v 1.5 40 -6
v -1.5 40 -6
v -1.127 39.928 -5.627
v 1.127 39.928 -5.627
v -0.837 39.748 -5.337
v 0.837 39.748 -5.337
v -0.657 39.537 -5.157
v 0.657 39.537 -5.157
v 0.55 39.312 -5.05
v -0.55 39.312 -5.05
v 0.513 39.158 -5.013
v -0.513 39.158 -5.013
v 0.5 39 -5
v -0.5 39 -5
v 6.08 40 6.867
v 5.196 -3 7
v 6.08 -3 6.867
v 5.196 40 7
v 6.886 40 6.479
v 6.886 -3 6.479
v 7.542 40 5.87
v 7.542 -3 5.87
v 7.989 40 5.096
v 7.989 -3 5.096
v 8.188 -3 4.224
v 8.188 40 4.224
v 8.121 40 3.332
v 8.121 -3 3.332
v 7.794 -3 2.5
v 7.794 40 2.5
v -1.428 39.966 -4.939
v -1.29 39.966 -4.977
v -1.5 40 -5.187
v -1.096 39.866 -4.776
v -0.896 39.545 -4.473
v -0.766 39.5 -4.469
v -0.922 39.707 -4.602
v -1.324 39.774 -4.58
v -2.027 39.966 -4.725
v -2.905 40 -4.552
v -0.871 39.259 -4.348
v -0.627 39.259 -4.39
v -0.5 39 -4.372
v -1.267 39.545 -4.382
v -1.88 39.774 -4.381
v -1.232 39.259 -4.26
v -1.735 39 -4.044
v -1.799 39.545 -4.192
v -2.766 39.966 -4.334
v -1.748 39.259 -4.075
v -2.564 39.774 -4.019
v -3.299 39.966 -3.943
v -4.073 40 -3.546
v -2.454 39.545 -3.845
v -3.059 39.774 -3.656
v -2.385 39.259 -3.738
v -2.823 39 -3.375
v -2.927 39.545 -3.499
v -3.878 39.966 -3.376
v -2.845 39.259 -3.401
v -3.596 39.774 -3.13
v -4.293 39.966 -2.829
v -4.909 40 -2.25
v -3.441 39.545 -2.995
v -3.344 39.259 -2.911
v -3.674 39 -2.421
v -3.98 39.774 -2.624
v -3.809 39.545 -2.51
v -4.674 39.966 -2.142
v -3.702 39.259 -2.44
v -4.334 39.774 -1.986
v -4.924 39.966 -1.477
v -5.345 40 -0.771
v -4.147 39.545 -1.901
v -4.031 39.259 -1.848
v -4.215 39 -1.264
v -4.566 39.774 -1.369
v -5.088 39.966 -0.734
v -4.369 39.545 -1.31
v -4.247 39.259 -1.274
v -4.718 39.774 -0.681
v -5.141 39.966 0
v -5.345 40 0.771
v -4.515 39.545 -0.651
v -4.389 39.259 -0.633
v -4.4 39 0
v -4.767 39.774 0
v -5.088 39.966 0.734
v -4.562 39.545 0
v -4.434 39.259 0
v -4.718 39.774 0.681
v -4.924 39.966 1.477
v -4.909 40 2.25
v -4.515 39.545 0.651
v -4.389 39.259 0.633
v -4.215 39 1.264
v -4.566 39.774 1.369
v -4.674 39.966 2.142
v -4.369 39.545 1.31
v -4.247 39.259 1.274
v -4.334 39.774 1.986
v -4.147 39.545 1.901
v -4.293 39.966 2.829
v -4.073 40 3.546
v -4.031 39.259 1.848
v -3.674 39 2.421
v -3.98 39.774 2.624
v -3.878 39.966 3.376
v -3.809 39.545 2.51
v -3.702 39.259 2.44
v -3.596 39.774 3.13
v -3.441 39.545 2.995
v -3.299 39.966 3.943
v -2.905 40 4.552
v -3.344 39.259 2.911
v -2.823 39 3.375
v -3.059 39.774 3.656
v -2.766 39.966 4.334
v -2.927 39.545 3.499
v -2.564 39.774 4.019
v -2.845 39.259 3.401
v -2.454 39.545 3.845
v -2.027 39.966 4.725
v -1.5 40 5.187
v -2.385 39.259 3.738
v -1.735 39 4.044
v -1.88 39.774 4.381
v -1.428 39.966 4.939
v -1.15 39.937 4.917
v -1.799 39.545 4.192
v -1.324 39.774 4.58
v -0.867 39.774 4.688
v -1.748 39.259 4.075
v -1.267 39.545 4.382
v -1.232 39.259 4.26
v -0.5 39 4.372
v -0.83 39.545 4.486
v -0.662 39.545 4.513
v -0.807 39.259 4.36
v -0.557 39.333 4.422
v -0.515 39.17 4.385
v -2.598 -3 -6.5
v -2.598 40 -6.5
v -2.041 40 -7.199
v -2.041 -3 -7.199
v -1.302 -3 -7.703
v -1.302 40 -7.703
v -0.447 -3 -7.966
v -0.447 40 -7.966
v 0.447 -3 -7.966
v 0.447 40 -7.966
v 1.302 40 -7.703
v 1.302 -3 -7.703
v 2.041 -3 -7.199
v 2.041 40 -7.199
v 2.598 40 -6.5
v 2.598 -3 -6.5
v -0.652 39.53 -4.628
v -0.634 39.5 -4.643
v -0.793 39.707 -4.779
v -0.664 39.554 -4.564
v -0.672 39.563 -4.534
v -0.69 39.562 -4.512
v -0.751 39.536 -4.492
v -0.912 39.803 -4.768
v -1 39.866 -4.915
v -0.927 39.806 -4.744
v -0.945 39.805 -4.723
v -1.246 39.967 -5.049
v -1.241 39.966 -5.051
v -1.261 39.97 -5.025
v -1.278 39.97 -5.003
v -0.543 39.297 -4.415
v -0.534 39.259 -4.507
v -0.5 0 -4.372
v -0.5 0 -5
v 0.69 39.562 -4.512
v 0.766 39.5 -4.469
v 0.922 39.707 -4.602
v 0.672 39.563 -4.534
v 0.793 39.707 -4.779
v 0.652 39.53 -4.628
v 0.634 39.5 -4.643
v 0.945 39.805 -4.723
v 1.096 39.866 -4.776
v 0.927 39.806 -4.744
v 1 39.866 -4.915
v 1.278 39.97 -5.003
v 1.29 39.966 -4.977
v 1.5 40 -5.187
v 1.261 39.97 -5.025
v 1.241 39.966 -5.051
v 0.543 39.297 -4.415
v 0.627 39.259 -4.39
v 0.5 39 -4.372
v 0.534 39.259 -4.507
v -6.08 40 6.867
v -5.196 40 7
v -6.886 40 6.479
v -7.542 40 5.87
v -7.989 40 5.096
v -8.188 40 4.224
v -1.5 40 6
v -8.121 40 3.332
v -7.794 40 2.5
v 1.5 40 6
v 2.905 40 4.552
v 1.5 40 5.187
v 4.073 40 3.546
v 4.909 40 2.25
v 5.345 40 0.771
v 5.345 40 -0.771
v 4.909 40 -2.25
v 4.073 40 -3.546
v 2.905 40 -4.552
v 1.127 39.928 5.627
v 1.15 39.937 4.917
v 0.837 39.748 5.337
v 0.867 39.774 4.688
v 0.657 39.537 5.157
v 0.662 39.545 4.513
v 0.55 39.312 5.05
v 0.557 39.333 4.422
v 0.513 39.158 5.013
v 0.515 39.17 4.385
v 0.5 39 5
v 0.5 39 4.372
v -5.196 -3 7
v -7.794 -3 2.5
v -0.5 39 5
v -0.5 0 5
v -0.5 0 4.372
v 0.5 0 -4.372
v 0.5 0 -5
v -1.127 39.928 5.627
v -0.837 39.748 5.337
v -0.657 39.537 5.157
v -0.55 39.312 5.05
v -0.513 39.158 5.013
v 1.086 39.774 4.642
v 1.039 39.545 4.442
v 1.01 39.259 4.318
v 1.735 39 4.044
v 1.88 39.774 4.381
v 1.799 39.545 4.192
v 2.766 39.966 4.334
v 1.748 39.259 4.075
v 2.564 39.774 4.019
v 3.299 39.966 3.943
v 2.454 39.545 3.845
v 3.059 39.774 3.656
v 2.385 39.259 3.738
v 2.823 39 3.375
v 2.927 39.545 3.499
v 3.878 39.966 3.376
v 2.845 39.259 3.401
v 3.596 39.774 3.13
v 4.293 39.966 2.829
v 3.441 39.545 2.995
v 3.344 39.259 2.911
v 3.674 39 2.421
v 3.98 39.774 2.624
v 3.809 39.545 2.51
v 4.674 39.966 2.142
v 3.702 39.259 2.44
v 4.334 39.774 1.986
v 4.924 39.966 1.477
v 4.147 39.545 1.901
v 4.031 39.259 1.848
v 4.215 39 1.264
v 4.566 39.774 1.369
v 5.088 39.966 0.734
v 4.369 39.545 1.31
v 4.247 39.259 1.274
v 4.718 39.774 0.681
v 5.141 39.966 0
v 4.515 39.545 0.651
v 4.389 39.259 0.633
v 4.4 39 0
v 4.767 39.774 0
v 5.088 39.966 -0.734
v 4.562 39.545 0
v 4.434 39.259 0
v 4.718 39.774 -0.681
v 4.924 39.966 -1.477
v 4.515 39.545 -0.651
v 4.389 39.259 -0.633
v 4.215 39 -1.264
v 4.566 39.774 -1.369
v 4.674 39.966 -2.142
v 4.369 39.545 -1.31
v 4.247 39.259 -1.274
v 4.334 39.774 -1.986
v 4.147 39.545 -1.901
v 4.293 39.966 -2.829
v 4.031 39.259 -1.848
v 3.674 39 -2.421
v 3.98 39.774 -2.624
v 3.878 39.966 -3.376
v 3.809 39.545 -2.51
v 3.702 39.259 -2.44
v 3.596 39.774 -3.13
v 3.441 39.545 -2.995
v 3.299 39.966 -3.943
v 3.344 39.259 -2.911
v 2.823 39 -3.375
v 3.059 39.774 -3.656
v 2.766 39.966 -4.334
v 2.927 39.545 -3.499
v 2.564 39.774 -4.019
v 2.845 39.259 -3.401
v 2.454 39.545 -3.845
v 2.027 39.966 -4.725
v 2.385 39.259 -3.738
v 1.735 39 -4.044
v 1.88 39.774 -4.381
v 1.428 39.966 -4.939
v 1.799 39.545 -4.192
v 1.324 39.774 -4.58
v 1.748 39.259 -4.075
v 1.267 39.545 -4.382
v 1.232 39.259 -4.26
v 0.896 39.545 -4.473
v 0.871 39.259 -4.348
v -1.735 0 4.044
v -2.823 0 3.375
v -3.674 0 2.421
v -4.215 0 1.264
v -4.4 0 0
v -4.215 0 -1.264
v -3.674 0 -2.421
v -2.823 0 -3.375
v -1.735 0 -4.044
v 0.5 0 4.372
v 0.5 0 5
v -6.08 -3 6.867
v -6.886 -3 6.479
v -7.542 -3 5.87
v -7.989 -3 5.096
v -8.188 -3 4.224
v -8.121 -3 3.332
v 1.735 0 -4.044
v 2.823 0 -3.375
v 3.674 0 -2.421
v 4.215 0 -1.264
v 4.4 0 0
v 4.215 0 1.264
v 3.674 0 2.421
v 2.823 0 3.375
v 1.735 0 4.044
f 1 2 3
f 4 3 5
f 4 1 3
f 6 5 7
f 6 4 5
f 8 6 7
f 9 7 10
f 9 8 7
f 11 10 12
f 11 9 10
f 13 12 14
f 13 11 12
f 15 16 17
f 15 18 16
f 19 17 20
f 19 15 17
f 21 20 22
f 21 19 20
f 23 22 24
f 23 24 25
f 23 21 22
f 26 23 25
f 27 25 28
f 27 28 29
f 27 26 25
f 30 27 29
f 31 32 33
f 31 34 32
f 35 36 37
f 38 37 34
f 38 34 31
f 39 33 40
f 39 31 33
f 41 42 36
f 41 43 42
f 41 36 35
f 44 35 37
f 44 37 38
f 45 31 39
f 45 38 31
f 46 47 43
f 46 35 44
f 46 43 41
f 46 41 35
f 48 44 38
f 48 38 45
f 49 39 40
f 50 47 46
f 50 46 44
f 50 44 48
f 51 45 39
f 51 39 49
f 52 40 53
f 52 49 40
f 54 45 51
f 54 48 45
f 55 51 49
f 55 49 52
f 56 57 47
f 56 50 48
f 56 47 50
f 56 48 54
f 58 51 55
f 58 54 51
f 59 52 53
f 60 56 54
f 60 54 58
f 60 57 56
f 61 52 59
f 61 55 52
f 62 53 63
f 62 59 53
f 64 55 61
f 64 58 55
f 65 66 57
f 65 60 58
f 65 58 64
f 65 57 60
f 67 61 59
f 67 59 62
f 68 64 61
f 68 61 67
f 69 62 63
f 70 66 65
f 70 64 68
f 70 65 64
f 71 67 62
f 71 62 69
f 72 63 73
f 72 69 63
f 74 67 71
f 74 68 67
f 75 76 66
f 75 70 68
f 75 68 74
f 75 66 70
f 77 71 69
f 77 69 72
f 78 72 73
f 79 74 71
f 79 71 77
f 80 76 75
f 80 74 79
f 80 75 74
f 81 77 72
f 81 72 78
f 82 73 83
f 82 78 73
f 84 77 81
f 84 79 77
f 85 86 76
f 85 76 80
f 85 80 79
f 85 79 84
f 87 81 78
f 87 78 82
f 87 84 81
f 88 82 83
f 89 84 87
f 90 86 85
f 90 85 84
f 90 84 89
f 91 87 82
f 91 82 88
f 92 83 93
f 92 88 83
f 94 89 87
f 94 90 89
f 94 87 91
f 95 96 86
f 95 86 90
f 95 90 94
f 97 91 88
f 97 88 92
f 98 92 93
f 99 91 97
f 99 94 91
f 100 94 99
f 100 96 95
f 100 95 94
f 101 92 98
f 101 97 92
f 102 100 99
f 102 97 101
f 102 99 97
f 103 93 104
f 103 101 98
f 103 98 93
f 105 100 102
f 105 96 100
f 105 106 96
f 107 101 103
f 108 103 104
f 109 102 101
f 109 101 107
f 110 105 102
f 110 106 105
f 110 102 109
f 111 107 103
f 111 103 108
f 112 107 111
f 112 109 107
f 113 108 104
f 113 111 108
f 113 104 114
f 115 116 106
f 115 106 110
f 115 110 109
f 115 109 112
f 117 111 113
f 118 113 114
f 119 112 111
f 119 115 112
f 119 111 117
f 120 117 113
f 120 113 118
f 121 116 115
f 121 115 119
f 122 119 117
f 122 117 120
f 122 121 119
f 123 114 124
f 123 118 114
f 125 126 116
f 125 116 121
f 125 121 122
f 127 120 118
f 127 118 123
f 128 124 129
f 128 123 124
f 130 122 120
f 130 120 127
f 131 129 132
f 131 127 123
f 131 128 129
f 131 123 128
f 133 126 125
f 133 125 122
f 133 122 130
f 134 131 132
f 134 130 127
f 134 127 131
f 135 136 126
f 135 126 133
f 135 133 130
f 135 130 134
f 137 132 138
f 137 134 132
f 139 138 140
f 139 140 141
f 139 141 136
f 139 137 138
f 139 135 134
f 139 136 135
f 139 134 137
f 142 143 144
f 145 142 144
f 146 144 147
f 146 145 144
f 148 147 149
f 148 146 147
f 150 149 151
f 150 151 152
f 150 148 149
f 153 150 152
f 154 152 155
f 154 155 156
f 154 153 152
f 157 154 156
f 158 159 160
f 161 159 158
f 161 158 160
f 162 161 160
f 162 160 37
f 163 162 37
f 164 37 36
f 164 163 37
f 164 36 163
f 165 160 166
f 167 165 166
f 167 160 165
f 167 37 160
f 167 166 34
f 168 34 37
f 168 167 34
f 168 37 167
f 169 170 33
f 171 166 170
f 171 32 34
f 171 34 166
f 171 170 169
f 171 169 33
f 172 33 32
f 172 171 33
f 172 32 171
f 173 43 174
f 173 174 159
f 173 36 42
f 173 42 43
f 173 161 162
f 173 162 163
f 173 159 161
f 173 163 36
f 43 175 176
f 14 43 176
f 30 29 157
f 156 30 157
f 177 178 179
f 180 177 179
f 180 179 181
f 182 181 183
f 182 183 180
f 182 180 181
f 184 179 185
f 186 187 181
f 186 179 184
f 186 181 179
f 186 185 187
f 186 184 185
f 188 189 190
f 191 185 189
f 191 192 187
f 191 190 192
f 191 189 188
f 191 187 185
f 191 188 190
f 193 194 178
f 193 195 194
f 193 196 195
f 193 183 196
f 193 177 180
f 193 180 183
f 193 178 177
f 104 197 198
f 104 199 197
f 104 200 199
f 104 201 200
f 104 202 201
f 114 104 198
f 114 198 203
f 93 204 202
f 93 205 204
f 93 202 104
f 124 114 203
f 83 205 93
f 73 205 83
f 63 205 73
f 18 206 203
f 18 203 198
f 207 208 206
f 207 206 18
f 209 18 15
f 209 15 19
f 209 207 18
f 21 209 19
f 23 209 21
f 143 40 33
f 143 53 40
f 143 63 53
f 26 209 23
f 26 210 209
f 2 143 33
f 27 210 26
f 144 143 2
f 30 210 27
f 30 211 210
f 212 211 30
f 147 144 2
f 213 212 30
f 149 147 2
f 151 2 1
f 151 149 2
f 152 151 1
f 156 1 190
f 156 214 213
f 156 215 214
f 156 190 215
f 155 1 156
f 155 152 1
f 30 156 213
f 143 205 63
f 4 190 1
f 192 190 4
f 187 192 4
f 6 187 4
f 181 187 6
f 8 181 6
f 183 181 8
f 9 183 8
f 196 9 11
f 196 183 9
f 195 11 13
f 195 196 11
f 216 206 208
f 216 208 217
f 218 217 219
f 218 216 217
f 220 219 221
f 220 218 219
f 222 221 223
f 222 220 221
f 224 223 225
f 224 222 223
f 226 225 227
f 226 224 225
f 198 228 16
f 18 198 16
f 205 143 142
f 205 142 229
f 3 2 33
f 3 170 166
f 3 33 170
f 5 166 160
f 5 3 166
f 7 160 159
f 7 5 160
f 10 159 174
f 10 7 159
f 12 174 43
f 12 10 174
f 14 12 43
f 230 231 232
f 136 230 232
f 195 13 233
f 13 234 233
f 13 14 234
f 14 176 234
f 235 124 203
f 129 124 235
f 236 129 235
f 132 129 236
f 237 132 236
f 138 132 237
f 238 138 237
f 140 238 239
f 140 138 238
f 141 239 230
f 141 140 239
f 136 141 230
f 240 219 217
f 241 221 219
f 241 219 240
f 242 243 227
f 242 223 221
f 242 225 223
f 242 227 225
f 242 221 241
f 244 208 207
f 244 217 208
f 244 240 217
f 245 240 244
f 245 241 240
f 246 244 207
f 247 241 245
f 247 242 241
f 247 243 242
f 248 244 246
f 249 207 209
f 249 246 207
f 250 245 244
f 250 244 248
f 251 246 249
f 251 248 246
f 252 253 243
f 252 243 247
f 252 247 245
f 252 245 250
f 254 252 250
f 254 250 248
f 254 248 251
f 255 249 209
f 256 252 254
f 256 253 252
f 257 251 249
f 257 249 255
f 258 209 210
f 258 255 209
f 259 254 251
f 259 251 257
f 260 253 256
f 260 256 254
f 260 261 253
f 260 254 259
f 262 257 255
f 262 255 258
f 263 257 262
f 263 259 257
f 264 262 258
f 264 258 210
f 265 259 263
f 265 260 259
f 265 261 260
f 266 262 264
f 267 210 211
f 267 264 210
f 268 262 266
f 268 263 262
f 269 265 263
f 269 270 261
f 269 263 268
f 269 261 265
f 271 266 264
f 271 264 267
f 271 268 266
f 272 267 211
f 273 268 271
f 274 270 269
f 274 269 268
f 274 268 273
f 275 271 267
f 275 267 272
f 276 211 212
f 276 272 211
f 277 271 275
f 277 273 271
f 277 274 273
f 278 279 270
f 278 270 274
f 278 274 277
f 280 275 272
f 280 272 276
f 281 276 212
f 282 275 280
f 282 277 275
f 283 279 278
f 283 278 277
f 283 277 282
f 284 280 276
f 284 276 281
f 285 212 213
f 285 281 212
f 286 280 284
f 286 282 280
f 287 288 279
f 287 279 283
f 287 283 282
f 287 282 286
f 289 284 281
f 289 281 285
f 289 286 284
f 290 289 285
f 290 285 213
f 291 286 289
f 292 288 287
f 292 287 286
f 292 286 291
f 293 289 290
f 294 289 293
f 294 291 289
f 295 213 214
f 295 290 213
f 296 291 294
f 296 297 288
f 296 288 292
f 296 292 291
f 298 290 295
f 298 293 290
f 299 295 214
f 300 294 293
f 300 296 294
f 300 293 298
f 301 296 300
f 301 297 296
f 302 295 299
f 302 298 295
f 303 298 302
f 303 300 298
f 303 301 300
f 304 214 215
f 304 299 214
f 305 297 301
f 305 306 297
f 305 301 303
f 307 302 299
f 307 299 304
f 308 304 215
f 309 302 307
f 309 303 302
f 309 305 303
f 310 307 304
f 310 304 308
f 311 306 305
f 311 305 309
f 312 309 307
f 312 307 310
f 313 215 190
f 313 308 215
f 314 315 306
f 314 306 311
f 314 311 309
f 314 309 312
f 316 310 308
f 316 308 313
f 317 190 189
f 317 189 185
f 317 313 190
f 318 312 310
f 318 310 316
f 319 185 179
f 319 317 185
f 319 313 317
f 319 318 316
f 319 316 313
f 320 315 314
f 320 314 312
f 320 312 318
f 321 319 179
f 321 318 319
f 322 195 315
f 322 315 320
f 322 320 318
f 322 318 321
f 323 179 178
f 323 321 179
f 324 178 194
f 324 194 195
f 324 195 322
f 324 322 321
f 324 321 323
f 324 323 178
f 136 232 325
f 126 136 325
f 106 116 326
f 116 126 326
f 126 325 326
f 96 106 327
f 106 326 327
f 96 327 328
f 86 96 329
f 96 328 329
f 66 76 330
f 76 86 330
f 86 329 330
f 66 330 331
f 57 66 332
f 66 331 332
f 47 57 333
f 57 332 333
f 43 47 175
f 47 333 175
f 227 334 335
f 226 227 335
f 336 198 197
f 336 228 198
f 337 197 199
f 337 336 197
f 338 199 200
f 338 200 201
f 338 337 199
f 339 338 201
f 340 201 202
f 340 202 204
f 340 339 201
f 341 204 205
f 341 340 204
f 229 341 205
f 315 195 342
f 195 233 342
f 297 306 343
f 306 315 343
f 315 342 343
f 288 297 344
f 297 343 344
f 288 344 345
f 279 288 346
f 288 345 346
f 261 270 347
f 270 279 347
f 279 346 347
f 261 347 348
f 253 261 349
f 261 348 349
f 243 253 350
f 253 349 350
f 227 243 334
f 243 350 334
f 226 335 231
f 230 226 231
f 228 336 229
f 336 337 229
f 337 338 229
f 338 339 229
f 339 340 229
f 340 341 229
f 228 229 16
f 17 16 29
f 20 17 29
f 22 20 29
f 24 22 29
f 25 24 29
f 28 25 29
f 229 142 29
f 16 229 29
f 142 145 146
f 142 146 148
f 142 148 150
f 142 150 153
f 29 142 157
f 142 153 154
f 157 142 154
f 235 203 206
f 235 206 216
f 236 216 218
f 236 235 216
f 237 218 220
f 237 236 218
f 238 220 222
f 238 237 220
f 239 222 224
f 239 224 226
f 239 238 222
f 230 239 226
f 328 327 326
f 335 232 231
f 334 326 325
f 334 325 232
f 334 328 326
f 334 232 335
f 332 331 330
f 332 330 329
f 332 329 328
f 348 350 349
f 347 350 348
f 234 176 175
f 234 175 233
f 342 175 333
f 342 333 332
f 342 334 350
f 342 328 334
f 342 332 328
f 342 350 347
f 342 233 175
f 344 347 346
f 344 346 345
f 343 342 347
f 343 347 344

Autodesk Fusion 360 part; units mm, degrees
sketch "Sketch1" plane through (0, 0, 0) normal (0, 1, 0) x (1, 0, 0)
  line L0 (-0.5, 5) -> (0.5, 5)
  line L1 (0.5, -5) -> (-0.5, -5)
  arc A0 (-0.5, 4.3715) -> (-0.5, -4.3715) centre (0, 0) ccw
  arc A1 (0.5, -4.3715) -> (0.5, 4.3715) centre (0, 0) ccw
  line L2 (0.5, 5) -> (0.5, 4.3715)
  line L3 (0.5, -4.3715) -> (0.5, -5)
  line L4 (-0.5, -5) -> (-0.5, -4.3715)
  line L5 (-0.5, 4.3715) -> (-0.5, 5)
  line L6 (10.3923, -7) -> (0, 11)
  line L7 (0, 11) -> (-10.3923, -7)
  line L8 (-10.3923, -7) -> (10.3923, -7)
  point P0 (0, -1)
  point P1 (0, -1)
  dimension "d1" = 8.8
  dimension "d10" = 1
  dimension "d11" = 6
  dimension "d12" = 4.4
extrude "Extrude1" add sketch "Sketch1" along normal blind 40
extrude "Extrude2" add sketch "Sketch1" against normal blind 3 contours L0 L1 A0 A1 L2 L3 L4 L5 | L6 L7 L8
fillet "Fillet1" radius 1 8 edges at (-4.4, 40, 0) (4.4, 40, 0) (-0.5, 40, -4.6857) (0.5, 40, -4.6857) (0, 40, -5) (-0.5, 40, 4.6857) (0, 40, 5) (0.5, 40, 4.6857)
fillet "Fillet2" radius 3 3 edges at (10.3923, 18.5, 7) (-10.3923, 18.5, 7) (0, 18.5, -11)
